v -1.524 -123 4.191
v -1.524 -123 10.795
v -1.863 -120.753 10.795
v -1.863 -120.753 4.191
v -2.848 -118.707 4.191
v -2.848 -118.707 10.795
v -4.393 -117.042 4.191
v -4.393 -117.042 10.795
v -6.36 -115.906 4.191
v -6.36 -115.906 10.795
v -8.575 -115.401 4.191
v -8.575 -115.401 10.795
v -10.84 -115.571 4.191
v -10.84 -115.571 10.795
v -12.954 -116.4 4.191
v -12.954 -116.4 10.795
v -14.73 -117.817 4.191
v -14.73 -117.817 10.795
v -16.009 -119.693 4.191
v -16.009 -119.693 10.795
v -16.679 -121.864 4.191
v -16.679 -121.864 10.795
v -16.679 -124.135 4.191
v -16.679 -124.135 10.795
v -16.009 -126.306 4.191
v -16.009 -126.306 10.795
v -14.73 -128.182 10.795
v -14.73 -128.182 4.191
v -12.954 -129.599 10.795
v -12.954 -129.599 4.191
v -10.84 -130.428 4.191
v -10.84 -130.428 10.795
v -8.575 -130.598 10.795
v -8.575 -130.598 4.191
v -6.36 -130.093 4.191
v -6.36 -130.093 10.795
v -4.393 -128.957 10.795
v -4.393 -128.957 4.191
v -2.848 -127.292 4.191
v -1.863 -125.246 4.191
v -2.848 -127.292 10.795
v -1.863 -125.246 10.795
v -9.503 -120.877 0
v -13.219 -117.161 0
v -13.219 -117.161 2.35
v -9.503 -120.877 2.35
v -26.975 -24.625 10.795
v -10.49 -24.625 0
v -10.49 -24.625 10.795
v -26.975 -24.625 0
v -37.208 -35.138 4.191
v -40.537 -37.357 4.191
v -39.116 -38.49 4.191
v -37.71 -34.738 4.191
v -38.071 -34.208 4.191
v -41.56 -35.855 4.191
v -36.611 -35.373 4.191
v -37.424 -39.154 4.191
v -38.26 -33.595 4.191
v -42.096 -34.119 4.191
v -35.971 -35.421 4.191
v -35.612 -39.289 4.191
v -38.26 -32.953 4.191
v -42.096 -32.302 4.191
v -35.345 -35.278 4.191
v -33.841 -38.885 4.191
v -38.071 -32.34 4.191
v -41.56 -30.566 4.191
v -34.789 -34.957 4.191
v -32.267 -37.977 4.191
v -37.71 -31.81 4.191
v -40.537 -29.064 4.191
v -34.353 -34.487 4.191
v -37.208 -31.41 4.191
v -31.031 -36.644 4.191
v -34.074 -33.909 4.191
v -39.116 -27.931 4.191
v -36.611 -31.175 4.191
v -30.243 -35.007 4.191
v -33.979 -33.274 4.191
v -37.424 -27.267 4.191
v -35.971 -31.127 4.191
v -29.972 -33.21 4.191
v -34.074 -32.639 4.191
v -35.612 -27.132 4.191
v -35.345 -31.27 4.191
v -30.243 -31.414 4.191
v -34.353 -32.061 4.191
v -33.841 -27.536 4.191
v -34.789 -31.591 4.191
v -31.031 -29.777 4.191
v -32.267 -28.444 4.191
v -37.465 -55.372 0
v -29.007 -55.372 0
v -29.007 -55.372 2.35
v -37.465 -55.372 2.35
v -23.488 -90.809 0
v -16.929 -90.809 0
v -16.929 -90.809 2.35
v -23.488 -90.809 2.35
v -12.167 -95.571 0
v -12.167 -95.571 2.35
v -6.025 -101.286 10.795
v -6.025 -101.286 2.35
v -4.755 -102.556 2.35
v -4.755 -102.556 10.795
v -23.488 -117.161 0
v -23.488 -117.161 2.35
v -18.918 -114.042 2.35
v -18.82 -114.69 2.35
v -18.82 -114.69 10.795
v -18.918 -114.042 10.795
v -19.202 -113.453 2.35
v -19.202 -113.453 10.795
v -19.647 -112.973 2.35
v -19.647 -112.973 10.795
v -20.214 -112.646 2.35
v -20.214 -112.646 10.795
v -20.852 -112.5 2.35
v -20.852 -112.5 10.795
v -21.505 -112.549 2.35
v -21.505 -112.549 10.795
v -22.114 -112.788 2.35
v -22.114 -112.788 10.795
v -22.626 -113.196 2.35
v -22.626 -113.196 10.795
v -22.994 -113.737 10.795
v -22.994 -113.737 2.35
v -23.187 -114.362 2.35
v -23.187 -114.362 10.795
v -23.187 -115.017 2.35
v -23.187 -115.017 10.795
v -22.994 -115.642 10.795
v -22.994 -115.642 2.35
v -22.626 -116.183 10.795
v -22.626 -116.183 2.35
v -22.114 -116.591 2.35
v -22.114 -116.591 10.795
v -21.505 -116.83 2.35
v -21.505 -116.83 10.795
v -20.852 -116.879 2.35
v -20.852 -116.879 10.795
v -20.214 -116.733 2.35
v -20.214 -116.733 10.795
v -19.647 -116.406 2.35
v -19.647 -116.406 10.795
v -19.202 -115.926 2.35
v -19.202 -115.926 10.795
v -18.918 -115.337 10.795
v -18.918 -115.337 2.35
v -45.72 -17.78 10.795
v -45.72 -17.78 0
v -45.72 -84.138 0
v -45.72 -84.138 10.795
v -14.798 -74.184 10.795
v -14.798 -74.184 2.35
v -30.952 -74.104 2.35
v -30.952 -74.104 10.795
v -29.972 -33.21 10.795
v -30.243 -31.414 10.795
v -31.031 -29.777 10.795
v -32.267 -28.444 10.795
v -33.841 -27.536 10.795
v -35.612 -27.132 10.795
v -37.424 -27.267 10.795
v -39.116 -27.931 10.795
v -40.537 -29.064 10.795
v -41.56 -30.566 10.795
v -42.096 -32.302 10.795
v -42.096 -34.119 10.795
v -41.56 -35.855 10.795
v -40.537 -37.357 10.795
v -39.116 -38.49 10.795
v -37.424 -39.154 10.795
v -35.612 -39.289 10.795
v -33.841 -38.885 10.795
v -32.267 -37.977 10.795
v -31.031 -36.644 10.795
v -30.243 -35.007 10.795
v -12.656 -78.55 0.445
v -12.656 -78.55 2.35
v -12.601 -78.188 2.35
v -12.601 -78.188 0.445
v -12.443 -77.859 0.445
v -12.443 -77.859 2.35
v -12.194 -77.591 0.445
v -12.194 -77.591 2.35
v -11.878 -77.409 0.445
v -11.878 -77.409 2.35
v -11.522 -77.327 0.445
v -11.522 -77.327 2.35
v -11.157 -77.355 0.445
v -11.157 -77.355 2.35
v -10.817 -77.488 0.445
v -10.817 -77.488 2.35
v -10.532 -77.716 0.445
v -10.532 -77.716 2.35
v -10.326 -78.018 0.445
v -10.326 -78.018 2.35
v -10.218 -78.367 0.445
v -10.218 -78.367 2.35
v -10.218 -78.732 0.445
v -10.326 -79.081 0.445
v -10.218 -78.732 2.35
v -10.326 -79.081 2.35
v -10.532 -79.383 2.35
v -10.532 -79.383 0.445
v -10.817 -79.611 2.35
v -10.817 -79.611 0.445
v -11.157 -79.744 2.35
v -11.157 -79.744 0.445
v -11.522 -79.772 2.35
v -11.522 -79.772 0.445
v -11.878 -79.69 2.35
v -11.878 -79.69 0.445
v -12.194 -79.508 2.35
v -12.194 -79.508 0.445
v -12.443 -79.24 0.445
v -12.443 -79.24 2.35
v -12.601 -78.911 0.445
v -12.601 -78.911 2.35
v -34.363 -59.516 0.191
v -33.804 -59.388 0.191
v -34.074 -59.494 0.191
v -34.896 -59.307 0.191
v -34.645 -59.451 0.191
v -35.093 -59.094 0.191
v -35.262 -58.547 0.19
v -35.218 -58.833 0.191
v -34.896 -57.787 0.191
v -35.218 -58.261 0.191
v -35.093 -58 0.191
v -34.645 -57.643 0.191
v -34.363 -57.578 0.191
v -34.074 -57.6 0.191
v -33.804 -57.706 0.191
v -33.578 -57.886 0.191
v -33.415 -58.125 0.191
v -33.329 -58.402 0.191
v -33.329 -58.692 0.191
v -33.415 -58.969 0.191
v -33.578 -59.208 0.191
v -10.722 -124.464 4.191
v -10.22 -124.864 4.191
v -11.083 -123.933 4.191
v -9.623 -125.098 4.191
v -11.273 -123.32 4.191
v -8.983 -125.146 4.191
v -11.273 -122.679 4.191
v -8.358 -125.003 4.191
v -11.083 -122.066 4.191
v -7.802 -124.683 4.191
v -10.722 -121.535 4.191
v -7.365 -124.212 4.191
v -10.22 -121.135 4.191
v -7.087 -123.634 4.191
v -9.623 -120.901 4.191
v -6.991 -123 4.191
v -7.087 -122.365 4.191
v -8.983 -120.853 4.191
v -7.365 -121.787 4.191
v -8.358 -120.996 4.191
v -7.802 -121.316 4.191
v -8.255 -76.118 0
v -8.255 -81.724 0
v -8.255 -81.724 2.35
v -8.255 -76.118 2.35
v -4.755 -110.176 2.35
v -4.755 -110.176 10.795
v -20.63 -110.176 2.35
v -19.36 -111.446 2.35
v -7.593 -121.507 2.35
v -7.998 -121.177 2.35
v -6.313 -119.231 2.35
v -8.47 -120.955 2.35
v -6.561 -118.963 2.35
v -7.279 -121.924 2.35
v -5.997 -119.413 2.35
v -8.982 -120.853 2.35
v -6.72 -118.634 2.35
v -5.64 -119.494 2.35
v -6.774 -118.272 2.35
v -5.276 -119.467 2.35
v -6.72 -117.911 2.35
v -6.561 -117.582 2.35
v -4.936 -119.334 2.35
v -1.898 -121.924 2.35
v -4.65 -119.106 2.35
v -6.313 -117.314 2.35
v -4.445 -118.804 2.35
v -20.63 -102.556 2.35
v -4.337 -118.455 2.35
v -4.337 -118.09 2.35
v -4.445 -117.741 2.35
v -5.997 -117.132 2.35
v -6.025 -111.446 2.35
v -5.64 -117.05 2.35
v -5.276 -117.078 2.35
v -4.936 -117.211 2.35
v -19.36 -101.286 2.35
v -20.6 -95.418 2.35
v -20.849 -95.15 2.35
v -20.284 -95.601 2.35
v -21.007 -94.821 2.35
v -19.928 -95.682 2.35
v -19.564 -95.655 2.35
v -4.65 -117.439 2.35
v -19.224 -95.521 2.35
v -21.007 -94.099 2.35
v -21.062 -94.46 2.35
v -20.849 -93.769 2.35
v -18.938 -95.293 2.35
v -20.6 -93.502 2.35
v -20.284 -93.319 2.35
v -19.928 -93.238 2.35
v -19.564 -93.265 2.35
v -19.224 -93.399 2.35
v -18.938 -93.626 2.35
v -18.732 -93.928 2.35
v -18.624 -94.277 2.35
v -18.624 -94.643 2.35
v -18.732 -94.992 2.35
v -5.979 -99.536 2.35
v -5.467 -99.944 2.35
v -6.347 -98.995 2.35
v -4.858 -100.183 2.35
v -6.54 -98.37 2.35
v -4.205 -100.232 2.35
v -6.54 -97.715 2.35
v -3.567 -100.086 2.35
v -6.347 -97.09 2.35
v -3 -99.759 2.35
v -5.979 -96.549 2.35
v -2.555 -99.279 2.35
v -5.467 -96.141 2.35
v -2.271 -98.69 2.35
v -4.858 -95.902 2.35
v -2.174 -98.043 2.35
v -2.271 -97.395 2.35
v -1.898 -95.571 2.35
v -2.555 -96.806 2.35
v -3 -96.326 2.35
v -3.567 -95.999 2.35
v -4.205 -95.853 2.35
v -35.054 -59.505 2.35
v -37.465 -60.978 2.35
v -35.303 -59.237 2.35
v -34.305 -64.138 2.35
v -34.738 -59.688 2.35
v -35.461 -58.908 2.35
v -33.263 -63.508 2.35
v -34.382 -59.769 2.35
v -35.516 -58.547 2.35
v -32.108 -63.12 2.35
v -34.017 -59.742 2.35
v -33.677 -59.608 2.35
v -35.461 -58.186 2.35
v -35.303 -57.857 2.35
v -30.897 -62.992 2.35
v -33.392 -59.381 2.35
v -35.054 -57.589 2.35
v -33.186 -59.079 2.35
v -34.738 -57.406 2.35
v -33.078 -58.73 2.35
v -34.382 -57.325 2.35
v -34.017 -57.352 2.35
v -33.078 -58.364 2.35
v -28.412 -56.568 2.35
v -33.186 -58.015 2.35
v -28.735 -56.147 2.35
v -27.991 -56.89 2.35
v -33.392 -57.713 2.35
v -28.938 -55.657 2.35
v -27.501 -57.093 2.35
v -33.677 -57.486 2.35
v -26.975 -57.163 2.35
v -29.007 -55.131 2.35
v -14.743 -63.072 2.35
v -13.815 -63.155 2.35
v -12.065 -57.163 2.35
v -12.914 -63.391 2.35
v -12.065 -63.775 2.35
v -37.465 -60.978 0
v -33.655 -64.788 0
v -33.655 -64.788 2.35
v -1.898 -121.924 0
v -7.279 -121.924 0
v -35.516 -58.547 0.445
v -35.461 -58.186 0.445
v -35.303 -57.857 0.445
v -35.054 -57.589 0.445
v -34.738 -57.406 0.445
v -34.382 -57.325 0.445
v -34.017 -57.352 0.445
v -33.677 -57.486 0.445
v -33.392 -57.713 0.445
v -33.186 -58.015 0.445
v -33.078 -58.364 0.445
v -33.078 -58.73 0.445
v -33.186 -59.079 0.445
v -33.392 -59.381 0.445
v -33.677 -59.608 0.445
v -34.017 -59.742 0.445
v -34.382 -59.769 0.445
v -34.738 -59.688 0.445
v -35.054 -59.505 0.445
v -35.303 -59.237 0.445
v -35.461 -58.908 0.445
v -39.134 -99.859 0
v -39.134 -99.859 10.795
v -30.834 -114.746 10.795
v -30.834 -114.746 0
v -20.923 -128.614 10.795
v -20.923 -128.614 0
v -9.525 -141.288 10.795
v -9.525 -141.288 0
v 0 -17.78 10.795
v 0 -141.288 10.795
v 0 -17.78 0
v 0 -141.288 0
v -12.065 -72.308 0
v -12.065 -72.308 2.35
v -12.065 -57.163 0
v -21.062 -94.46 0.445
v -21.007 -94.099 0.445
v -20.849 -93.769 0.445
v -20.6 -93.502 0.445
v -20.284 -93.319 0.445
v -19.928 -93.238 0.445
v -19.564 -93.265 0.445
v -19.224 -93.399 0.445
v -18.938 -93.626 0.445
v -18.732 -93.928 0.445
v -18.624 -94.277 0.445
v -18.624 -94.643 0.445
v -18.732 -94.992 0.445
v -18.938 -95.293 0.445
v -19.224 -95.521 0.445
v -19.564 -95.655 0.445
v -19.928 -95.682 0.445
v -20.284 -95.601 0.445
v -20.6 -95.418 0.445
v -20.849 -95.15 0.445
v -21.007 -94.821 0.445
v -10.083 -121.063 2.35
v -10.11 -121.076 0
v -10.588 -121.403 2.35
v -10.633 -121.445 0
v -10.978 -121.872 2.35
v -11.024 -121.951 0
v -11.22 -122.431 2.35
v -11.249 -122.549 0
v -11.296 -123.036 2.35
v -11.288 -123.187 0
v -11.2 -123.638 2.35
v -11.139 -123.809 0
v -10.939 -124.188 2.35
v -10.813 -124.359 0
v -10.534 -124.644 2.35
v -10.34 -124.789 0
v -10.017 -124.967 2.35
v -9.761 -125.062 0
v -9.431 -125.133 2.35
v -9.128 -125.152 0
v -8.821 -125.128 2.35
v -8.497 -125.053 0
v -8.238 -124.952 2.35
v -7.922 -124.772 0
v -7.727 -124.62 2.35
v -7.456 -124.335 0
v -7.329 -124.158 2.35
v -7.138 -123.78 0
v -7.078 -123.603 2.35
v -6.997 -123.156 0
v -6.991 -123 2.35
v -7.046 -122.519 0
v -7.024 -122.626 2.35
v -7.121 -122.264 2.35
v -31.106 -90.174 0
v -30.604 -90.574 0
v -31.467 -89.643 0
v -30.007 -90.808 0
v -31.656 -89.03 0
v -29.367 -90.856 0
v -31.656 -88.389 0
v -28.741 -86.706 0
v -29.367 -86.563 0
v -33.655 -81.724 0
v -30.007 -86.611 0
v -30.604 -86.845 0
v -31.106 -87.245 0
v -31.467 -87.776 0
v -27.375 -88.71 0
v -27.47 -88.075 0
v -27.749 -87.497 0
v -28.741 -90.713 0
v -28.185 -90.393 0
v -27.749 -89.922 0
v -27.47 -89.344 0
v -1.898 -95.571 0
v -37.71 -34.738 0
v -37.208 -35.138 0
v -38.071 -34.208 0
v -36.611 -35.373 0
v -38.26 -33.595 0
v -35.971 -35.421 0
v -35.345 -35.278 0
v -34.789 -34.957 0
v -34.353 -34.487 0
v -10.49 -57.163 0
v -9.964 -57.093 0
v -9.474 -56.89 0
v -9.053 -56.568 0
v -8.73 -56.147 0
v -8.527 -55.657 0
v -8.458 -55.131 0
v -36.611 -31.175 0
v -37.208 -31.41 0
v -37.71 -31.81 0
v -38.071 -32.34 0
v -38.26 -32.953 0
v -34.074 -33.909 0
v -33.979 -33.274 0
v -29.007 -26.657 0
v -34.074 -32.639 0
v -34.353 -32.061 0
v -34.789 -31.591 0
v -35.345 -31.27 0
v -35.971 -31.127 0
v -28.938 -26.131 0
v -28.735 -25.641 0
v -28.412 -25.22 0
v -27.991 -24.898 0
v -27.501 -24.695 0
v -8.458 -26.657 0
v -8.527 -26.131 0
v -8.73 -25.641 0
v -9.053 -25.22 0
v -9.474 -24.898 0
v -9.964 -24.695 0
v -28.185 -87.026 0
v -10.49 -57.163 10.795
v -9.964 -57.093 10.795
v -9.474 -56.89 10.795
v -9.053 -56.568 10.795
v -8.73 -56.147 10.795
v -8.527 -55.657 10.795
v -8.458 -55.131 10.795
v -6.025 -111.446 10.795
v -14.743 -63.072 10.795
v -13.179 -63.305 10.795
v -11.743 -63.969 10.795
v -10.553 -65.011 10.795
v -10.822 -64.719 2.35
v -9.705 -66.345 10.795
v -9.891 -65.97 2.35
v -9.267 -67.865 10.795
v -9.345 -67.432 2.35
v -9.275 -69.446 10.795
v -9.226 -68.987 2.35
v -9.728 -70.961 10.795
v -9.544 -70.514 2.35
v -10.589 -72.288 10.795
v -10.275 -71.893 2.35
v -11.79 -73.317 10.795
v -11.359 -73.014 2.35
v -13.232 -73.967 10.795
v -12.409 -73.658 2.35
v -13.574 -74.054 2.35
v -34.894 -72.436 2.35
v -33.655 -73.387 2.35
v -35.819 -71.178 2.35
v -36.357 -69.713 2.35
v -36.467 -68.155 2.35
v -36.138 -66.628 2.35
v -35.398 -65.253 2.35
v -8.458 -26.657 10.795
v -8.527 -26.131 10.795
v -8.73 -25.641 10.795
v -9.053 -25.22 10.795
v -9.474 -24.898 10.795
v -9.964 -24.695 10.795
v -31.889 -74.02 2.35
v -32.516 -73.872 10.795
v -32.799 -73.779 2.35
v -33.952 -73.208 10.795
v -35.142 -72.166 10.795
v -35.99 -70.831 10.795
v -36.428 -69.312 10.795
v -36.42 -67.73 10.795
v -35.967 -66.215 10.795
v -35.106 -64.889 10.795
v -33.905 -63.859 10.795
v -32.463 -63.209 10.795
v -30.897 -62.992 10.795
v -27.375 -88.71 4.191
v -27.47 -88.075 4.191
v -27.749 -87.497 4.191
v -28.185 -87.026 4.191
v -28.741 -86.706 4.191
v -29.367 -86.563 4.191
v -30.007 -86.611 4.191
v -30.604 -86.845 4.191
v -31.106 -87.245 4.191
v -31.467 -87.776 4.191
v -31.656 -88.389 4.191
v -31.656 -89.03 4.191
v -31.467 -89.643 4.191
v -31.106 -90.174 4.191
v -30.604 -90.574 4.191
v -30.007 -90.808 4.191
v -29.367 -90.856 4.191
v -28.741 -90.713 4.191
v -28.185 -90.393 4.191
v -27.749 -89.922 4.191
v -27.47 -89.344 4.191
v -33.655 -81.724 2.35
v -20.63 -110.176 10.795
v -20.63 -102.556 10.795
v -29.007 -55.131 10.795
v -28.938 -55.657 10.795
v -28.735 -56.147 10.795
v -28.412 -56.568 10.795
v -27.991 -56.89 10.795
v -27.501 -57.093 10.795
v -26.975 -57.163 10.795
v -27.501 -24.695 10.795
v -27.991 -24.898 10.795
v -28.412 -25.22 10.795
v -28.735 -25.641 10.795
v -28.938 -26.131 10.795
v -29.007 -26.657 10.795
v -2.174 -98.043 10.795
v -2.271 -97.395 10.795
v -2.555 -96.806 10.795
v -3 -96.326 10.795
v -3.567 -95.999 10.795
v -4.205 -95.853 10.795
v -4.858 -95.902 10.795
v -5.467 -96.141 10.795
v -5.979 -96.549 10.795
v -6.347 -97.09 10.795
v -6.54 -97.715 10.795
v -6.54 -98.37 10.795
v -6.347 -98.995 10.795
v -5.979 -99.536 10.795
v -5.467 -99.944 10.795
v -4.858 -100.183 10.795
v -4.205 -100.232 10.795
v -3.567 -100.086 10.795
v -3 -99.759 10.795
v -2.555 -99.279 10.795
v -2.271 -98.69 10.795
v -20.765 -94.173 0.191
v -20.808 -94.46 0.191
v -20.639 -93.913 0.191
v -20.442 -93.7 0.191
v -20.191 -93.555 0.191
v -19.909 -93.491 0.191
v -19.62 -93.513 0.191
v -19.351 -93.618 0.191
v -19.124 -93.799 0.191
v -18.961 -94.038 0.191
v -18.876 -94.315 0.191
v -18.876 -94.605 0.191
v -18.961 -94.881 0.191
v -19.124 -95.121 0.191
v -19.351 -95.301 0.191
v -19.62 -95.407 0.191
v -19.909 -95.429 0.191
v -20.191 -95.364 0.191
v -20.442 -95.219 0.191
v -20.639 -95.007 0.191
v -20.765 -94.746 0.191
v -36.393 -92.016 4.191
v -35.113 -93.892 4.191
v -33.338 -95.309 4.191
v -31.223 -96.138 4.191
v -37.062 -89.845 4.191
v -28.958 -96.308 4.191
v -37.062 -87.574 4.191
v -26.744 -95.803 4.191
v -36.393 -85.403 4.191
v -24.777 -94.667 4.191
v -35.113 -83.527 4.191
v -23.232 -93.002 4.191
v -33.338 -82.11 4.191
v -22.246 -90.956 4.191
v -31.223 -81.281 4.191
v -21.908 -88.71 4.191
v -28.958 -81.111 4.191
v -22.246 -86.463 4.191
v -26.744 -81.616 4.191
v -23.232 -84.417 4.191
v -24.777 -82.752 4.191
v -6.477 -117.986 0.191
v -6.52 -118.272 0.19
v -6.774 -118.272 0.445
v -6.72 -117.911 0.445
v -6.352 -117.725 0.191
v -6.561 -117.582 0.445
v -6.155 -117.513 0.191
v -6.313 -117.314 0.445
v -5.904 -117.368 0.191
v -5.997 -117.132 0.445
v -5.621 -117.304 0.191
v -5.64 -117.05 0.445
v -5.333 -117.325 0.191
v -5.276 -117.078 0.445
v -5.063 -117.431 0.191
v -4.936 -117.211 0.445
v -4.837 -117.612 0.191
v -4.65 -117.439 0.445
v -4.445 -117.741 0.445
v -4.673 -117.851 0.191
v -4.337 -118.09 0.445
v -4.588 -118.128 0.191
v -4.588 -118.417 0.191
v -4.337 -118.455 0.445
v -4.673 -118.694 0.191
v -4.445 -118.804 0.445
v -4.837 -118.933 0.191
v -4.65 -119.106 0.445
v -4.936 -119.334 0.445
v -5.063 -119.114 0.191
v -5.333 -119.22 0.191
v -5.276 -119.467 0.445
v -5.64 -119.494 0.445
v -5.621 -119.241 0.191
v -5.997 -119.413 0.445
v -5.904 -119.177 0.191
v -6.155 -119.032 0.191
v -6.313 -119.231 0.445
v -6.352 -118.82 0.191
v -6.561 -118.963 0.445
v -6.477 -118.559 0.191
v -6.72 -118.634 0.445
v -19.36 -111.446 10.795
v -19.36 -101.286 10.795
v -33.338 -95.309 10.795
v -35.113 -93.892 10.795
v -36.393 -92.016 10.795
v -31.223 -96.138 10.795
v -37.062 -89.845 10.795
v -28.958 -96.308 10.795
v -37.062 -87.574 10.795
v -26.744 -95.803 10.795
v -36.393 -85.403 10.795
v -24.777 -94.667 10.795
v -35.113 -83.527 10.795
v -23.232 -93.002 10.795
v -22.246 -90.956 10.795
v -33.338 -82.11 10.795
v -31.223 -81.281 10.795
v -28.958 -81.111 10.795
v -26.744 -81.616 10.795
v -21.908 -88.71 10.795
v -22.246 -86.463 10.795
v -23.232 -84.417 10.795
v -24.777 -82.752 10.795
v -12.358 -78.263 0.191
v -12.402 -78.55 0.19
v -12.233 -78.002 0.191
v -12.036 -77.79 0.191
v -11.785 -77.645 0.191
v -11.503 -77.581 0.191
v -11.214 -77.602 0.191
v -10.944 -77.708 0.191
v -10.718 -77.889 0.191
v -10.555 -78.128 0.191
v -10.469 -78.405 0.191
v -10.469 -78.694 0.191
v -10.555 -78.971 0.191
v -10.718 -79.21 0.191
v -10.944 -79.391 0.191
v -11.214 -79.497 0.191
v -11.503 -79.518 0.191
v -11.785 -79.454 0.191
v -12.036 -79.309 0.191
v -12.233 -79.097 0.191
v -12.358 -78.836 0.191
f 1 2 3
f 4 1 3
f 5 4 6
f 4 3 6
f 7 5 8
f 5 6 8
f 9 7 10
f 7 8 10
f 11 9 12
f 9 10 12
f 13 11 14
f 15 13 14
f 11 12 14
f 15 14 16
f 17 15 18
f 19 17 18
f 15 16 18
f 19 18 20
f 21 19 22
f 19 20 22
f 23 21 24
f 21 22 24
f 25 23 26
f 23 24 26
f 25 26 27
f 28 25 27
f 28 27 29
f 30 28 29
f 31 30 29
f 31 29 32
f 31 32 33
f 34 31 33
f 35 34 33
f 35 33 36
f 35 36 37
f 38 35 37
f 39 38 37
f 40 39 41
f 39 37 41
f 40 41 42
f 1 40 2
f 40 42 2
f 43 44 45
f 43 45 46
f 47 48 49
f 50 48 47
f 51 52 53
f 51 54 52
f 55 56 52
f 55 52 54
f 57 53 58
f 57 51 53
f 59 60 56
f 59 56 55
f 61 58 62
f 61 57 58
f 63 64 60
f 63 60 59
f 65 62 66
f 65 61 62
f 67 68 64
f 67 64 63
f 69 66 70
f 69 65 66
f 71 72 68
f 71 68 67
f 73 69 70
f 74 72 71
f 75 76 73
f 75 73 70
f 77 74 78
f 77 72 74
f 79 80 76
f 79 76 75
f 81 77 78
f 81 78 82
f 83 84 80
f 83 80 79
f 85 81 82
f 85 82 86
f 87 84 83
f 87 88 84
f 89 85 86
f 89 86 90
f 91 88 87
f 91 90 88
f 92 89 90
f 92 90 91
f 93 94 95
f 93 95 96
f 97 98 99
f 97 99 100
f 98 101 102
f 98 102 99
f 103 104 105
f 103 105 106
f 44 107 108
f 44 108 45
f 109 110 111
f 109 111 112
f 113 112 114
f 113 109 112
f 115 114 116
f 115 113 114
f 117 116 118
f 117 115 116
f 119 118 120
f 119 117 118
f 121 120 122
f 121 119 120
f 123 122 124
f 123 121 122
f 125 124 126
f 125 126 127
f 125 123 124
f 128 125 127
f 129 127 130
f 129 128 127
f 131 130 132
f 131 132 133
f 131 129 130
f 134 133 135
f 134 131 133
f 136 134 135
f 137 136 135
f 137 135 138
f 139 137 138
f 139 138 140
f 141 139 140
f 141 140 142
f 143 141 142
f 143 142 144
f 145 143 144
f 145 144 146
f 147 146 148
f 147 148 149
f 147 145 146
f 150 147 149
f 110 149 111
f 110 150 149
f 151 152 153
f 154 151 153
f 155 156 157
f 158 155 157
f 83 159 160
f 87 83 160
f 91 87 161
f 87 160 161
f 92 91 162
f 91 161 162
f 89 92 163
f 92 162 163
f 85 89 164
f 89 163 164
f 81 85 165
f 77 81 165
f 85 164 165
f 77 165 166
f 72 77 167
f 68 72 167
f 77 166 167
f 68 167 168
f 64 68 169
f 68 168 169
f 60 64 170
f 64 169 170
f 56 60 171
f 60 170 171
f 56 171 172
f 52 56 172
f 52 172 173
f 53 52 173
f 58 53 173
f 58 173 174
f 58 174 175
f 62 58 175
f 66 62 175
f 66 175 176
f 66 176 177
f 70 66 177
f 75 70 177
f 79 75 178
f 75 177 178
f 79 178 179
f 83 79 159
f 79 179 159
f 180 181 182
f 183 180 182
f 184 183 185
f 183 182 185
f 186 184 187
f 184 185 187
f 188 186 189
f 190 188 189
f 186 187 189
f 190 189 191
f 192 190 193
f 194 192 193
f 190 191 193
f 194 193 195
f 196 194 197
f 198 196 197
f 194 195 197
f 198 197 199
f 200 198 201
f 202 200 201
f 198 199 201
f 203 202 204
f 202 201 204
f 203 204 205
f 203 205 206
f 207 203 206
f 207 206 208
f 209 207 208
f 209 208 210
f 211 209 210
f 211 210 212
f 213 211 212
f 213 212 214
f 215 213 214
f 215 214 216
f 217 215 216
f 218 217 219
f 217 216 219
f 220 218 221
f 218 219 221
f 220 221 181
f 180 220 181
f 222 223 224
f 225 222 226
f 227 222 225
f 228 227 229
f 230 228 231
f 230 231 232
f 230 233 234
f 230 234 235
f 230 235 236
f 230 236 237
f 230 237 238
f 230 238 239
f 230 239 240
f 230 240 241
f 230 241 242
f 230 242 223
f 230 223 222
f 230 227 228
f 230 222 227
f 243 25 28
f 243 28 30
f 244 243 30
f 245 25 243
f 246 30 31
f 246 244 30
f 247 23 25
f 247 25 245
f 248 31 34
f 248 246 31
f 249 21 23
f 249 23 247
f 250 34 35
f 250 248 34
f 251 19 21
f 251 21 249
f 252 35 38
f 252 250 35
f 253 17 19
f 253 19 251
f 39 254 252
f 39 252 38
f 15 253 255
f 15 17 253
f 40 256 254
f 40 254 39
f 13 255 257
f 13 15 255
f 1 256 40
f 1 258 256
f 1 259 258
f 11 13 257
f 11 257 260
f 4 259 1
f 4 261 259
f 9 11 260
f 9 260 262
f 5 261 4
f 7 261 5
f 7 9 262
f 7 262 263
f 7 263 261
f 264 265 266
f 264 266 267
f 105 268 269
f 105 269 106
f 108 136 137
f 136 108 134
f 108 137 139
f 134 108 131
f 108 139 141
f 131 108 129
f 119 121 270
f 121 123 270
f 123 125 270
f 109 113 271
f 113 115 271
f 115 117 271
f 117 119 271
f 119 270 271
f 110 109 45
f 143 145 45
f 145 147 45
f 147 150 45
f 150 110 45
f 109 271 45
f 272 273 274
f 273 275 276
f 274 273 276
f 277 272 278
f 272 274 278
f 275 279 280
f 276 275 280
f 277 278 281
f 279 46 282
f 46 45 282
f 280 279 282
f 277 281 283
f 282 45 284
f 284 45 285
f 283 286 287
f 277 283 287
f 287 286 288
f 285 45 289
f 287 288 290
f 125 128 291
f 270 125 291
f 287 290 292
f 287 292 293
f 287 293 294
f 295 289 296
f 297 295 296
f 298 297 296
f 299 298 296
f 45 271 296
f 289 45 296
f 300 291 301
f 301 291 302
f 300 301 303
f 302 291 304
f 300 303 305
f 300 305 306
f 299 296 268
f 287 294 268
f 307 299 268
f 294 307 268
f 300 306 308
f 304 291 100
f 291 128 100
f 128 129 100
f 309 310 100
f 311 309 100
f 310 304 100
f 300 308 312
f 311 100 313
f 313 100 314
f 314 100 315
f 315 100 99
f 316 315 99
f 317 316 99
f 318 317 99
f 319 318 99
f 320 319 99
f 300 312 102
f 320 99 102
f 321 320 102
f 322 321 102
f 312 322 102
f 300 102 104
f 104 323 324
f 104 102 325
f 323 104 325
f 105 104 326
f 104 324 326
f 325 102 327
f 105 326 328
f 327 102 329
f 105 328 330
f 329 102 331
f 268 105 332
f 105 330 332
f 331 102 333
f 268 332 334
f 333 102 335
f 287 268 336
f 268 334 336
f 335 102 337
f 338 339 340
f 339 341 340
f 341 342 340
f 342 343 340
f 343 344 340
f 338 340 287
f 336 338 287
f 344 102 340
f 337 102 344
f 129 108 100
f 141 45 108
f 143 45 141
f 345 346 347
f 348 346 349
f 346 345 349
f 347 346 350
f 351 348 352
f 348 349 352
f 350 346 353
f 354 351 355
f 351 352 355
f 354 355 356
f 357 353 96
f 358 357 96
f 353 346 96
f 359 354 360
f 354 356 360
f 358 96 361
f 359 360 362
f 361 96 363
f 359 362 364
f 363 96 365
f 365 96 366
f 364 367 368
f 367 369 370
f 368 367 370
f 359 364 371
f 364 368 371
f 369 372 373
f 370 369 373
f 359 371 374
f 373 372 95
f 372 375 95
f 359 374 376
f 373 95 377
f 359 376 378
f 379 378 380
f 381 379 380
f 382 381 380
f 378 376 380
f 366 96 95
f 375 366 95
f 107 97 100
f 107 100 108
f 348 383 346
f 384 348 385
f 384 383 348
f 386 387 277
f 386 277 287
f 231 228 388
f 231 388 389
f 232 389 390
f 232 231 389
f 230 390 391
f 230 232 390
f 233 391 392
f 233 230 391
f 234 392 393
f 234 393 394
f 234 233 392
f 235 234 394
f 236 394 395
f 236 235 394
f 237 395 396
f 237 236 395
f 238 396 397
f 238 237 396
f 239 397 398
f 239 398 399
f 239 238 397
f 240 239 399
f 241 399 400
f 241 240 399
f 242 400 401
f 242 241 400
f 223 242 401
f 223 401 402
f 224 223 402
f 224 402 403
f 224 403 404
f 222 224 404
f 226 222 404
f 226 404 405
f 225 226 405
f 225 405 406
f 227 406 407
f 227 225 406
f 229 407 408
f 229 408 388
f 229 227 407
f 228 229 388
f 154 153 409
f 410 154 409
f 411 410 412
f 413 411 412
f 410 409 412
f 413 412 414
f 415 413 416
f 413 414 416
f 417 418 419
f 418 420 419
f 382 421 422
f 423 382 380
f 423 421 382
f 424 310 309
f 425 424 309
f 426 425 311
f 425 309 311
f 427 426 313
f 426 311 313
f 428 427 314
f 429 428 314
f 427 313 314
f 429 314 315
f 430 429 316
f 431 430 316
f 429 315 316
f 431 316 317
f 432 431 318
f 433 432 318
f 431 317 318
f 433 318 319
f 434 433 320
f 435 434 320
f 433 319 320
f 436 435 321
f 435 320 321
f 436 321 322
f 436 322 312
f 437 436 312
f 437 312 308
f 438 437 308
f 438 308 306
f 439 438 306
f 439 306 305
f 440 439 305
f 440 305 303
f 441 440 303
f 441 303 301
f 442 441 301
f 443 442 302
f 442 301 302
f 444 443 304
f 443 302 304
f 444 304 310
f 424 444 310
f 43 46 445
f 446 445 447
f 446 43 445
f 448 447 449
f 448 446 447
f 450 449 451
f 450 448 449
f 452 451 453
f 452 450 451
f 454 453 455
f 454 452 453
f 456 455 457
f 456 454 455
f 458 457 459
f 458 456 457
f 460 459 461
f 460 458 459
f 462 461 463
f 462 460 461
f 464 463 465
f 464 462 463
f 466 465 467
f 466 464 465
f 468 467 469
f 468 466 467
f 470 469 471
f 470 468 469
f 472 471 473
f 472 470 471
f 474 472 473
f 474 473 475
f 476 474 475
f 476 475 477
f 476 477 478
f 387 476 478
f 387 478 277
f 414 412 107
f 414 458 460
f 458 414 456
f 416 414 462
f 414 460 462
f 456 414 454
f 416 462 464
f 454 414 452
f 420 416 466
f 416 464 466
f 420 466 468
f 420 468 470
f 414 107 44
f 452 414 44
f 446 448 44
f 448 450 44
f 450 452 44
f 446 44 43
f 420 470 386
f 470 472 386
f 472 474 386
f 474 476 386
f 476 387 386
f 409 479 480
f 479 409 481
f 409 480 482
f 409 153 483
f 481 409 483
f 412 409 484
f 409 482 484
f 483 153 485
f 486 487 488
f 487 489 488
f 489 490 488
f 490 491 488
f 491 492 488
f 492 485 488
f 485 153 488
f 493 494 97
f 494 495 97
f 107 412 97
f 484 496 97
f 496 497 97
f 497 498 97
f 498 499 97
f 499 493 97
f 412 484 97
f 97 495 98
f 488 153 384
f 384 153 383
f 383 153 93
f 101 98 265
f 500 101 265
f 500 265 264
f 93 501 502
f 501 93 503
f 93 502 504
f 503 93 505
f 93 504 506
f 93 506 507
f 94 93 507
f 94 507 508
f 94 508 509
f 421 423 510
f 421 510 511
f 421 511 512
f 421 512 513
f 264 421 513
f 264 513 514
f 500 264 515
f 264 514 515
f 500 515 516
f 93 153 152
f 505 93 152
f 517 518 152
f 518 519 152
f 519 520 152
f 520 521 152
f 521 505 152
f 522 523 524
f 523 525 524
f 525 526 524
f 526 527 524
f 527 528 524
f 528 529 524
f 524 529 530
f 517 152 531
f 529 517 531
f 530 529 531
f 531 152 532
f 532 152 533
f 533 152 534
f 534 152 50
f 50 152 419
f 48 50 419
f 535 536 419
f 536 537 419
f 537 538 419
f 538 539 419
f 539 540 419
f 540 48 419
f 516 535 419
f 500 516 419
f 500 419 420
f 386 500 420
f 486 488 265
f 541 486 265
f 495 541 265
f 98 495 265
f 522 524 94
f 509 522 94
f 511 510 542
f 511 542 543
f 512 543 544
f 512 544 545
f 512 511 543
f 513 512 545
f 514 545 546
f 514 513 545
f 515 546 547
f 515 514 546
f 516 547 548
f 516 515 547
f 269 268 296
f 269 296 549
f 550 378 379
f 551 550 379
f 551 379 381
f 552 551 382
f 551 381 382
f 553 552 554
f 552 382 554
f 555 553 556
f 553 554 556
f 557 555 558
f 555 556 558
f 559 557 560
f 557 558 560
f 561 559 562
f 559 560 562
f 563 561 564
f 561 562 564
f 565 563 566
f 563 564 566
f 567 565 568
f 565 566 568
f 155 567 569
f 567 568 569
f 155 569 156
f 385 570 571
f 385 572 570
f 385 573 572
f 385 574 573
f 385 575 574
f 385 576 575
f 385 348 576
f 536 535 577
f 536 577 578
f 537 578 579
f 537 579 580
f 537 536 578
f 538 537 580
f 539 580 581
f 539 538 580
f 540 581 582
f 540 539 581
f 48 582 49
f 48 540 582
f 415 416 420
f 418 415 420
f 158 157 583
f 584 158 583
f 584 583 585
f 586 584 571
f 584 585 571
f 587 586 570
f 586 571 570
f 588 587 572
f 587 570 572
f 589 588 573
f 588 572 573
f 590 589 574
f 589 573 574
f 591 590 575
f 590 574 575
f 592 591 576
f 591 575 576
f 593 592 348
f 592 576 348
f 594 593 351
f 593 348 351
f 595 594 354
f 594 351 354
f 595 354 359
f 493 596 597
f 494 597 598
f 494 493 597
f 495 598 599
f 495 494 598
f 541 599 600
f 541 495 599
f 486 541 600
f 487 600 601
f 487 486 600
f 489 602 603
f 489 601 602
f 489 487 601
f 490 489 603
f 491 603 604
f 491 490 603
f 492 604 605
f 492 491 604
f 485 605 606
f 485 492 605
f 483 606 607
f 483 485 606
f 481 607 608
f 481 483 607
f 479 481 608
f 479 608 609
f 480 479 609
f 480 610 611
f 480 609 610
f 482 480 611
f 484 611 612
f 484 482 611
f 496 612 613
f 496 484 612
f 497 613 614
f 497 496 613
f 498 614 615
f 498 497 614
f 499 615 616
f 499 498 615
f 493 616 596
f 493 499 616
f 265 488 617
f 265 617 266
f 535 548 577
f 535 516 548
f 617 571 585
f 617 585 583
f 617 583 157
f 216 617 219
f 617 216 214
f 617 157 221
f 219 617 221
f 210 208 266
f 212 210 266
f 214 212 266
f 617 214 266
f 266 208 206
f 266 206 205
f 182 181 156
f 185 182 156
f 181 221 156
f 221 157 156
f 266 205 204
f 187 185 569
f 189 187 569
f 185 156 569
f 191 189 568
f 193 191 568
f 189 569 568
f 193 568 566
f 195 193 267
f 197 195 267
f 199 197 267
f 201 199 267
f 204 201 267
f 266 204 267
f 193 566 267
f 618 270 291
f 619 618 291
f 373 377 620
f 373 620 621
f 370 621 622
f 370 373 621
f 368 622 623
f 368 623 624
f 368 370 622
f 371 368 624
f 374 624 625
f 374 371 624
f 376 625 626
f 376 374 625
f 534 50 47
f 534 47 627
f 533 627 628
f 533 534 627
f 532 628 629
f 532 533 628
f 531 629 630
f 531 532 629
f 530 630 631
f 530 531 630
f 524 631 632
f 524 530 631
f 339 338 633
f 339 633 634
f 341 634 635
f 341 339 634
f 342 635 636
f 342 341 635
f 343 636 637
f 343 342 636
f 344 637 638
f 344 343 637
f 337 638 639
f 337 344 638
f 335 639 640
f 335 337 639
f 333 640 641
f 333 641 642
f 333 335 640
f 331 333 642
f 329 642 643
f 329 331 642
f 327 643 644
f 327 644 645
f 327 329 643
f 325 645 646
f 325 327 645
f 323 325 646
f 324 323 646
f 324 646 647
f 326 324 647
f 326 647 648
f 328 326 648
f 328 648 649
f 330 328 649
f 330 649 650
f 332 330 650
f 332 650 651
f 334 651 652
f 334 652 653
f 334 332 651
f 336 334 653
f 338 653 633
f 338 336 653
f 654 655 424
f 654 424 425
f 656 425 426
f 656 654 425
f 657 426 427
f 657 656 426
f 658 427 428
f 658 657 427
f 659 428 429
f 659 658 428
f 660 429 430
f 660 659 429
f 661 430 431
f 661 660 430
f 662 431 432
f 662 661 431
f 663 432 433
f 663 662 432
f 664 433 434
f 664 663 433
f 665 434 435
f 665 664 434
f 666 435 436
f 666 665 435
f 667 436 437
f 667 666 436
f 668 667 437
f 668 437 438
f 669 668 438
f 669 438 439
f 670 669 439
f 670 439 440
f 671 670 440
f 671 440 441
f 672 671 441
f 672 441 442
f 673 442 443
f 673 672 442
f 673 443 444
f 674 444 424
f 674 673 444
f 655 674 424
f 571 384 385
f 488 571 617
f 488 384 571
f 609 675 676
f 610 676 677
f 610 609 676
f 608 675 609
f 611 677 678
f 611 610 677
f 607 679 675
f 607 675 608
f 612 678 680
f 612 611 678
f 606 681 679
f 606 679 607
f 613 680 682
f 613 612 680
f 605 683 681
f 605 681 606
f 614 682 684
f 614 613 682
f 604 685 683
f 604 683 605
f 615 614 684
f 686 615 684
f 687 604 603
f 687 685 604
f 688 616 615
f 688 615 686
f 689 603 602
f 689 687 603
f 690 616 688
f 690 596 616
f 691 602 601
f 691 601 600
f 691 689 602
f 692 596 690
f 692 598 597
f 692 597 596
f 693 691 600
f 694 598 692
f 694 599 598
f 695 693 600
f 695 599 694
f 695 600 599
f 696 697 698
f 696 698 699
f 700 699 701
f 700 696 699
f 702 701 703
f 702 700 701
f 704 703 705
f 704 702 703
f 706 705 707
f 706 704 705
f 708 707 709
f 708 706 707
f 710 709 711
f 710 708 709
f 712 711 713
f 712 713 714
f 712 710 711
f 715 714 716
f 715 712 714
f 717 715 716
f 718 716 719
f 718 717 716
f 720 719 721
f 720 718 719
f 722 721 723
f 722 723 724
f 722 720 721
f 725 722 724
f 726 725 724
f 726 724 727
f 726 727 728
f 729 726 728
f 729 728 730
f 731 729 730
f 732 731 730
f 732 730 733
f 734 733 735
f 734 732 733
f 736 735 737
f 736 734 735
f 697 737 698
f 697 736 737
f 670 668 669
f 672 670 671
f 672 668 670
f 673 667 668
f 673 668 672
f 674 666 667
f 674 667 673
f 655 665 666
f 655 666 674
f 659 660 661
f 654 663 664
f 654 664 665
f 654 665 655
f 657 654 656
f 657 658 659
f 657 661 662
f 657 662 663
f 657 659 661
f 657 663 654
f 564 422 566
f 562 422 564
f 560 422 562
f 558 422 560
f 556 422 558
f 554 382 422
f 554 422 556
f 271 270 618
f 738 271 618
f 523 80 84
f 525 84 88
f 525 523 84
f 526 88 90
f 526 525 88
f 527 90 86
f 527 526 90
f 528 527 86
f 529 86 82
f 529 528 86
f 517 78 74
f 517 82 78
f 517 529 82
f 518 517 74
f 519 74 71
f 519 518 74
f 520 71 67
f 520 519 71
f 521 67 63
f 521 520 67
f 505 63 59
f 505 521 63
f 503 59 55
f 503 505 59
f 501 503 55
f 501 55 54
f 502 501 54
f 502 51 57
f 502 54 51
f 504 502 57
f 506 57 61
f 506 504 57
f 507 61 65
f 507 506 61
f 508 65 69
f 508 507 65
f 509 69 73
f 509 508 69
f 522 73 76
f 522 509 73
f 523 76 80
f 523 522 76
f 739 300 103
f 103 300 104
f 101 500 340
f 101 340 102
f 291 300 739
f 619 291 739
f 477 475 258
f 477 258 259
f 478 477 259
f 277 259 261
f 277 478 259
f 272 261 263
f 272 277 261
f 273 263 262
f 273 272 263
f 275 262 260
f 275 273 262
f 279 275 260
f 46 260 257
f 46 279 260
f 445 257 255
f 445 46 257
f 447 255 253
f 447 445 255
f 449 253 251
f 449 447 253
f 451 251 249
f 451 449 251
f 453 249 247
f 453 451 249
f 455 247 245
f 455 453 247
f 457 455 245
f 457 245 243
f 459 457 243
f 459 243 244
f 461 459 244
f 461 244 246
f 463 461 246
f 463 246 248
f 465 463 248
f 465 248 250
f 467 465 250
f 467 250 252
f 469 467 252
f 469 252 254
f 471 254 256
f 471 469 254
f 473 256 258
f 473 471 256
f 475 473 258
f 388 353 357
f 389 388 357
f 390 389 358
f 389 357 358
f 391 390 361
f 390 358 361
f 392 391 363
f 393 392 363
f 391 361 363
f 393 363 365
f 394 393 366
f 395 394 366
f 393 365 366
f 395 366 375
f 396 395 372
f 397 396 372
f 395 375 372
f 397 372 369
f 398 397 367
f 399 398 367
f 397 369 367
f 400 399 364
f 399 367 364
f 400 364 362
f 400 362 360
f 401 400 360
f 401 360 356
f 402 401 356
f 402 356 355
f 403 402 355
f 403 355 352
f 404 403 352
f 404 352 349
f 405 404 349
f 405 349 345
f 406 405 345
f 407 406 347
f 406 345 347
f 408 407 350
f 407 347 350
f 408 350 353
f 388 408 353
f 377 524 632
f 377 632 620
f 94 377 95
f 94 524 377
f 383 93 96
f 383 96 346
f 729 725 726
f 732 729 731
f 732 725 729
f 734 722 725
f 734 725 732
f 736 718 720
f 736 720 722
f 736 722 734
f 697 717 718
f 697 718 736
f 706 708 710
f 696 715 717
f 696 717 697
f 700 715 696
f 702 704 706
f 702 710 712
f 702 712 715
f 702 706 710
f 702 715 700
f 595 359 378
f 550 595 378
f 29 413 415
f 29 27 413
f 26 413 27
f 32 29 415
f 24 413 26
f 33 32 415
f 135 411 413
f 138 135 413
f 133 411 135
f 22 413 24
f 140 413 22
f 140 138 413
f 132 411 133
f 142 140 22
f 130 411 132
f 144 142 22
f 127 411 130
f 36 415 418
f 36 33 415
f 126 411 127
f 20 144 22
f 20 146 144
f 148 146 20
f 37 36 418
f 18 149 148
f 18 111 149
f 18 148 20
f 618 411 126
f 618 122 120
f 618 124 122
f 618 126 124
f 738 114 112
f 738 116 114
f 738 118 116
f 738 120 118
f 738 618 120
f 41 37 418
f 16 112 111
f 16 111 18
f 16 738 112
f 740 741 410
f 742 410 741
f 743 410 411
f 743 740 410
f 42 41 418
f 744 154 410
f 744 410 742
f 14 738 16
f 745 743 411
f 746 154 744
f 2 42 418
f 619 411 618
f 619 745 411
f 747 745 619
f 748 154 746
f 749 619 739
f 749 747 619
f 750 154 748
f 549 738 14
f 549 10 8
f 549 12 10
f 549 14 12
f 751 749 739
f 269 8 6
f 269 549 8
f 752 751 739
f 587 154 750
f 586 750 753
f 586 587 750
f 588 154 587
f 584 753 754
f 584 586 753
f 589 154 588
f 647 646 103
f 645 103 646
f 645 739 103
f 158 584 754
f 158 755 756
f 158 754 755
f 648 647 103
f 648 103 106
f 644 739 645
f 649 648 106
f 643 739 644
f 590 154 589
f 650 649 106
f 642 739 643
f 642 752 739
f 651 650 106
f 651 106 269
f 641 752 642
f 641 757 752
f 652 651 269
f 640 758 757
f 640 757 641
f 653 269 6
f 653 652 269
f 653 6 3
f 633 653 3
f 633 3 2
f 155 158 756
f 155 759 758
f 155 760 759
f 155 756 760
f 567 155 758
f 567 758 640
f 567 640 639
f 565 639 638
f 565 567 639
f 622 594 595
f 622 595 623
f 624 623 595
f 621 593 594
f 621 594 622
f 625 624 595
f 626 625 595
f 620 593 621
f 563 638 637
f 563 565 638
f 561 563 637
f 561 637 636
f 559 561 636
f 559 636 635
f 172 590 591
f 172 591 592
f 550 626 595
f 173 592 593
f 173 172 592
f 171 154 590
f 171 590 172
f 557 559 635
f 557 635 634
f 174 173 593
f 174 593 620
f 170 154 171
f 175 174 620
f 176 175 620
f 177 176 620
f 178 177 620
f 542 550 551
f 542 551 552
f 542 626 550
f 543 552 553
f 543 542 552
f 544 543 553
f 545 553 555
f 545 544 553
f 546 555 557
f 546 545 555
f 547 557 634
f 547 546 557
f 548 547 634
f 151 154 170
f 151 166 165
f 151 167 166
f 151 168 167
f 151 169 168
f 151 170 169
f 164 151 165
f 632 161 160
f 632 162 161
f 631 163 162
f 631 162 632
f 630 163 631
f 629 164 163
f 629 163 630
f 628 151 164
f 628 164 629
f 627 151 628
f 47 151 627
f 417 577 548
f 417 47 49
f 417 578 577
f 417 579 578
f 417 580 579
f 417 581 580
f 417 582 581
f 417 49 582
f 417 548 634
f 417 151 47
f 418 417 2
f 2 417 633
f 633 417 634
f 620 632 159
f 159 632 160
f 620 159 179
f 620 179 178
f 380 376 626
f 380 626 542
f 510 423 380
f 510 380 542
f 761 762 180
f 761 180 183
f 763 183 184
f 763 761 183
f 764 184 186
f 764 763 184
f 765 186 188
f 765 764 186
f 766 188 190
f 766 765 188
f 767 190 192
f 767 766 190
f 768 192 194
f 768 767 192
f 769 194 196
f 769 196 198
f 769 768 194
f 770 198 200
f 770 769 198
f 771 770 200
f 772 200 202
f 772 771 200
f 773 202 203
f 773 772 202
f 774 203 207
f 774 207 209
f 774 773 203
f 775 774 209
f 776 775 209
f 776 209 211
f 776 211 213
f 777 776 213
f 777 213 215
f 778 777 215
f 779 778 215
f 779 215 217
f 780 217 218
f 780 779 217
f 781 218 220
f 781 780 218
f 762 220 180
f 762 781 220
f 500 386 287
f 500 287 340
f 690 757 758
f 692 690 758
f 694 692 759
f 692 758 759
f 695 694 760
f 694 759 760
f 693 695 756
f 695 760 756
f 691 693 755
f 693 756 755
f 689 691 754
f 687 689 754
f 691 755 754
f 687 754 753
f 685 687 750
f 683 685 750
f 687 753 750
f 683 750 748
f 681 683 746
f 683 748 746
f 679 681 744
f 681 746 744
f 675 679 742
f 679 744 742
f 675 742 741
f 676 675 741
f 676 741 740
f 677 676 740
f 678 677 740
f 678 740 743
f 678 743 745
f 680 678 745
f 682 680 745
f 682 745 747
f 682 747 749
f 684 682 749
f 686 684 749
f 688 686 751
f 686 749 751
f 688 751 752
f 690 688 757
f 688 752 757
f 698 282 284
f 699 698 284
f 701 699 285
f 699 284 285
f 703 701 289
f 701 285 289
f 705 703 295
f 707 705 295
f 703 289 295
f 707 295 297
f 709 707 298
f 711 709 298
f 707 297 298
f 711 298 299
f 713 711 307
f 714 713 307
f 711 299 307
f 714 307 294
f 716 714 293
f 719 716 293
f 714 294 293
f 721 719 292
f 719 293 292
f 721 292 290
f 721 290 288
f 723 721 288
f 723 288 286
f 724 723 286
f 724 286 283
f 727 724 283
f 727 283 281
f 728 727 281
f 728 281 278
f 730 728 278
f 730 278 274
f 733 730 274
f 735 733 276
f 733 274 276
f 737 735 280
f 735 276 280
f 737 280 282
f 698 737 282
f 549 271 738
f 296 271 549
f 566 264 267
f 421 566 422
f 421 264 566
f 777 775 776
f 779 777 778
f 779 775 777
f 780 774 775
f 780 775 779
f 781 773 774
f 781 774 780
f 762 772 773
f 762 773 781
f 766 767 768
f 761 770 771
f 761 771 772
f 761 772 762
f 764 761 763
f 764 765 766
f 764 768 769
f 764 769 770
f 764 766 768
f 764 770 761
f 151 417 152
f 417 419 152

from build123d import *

# Parameters (mm, degrees)
SKETCH1_R           = 2.15265
BOSS_EXTRUDE1_DEPTH = 2.3495
SKETCH2_R           = 2.15265
SKETCH2_R_2         = 2.195581339
SKETCH2_W           = 15.875
SKETCH2_H           = 10.16
BOSS_EXTRUDE2_DEPTH = 8.4455
SKETCH3_R           = 1.22555
BOSS_EXTRUDE3_DEPTH = 2.159
CHAMFER1_SIZE       = 0.254
CHAMFER2_SIZE       = 1.27
SKETCH5_R           = 7.62
SKETCH5_R_2         = 6.096
CUT_EXTRUDE1_DEPTH  = 6.604


with BuildPart() as part:
    # Sketch1 → Boss-Extrude1 (new body)
    with BuildSketch(Plane.XY):
        with BuildLine():
            Line((0, -17.78), (-45.72, -17.78))
            Line((-45.72, -17.78), (-45.72, -84.1375))
            ThreePointArc((-45.72, -84.1375), (-30.833523511, -114.746148224), (-9.525, -141.2875))
            Line((-9.525, -141.2875), (0, -141.2875))
            Line((0, -141.2875), (0, -17.78))
        make_face()
        with Locations((-36.1315, -33.274)):
            Circle(SKETCH1_R, mode=Mode.SUBTRACT)
        with Locations((-29.5275, -88.7095)):
            Circle(SKETCH1_R, mode=Mode.SUBTRACT)
        with BuildLine():
            Line((-1.89756812, -121.923613785), (-1.89756812, -95.571113785))
            Line((-1.89756812, -95.571113785), (-12.166516896, -95.571113785))
            Line((-12.166516896, -95.571113785), (-16.929016896, -90.808613785))
            Line((-16.929016896, -90.808613785), (-23.48756812, -90.808613785))
            Line((-23.48756812, -90.808613785), (-23.48756812, -117.161113785))
            Line((-23.48756812, -117.161113785), (-13.218619344, -117.161113785))
            Line((-13.218619344, -117.161113785), (-9.502774703, -120.876958426))
            ThreePointArc((-9.502774703, -120.876958426), (-10.060883947, -124.947120561), (-7.279497151, -121.923613785))
            Line((-7.279497151, -121.923613785), (-1.89756812, -121.923613785))
        make_face(mode=Mode.SUBTRACT)
        with BuildLine():
            Line((-33.655, -81.7245), (-8.255, -81.7245))
            Line((-8.255, -81.7245), (-8.255, -76.118448776))
            Line((-8.255, -76.118448776), (-12.065, -72.308448776))
            Line((-12.065, -72.308448776), (-12.065, -57.1627))
            Line((-12.065, -57.1627), (-10.4902, -57.1627))
            ThreePointArc((-10.4902, -57.1627), (-9.053359021, -56.567540979), (-8.4582, -55.1307))
            Line((-8.4582, -55.1307), (-8.4582, -26.6573))
            ThreePointArc((-8.4582, -26.6573), (-9.053359021, -25.220459021), (-10.4902, -24.6253))
            Line((-10.4902, -24.6253), (-26.9748, -24.6253))
            ThreePointArc((-26.9748, -24.6253), (-28.411640979, -25.220459021), (-29.0068, -26.6573))
            Line((-29.0068, -26.6573), (-29.0068, -55.372))
            Line((-29.0068, -55.372), (-37.465, -55.372))
            Line((-37.465, -55.372), (-37.465, -60.978051224))
            Line((-37.465, -60.978051224), (-33.655, -64.788051224))
            Line((-33.655, -64.788051224), (-33.655, -81.7245))
        make_face(mode=Mode.SUBTRACT)
    extrude(amount=BOSS_EXTRUDE1_DEPTH)

    # Sketch2 → Boss-Extrude2 (add)
    with BuildSketch(Plane.XY.offset(2.3495)):
        with BuildLine():
            Line((-9.525, -141.2875), (0, -141.2875))
            Line((0, -141.2875), (0, -17.78))
            Line((0, -17.78), (-45.72, -17.78))
            Line((-45.72, -17.78), (-45.72, -84.1375))
            ThreePointArc((-45.72, -84.1375), (-30.833523511, -114.746148224), (-9.525, -141.2875))
        make_face()
        with Locations((-9.144, -122.9995)):
            Circle(SKETCH2_R, mode=Mode.SUBTRACT)
        with Locations((-29.5275, -88.7095)):
            Circle(SKETCH2_R, mode=Mode.SUBTRACT)
        with Locations((-21.016048243, -114.689593907)):
            Circle(SKETCH2_R_2, mode=Mode.SUBTRACT)
        with Locations((-4.369087998, -98.042633662)):
            Circle(SKETCH2_R_2, mode=Mode.SUBTRACT)
        with Locations((-36.1315, -33.274)):
            Circle(SKETCH2_R, mode=Mode.SUBTRACT)
        with Locations((-12.69256812, -106.366113785)):
            Rectangle(SKETCH2_W, SKETCH2_H, mode=Mode.SUBTRACT)
        with BuildLine():
            Line((-14.798016067, -74.184431866), (-30.952016067, -74.104431866))
            ThreePointArc((-30.952016067, -74.104431866), (-36.480681866, -68.520733933), (-30.896983933, -62.992068134))
            Line((-30.896983933, -62.992068134), (-14.742983933, -63.072068134))
            ThreePointArc((-14.742983933, -63.072068134), (-9.214318134, -68.655766067), (-14.798016067, -74.184431866))
        make_face(mode=Mode.SUBTRACT)
        with BuildLine():
            Line((-8.4582, -55.1307), (-8.4582, -26.6573))
            ThreePointArc((-8.4582, -26.6573), (-9.053359021, -25.220459021), (-10.4902, -24.6253))
            Line((-10.4902, -24.6253), (-26.9748, -24.6253))
            ThreePointArc((-26.9748, -24.6253), (-28.411640979, -25.220459021), (-29.0068, -26.6573))
            Line((-29.0068, -26.6573), (-29.0068, -55.1307))
            ThreePointArc((-29.0068, -55.1307), (-28.411640979, -56.567540979), (-26.9748, -57.1627))
            Line((-26.9748, -57.1627), (-10.4902, -57.1627))
            ThreePointArc((-10.4902, -57.1627), (-9.053359021, -56.567540979), (-8.4582, -55.1307))
        make_face(mode=Mode.SUBTRACT)
    extrude(amount=BOSS_EXTRUDE2_DEPTH)

    # Sketch3 → Boss-Extrude3 (add)
    with BuildSketch(Plane(origin=(0, 0, 2.3495), x_dir=(-1, 0, 0), z_dir=(0, 0, -1))):
        with Locations((34.29, -58.547)):
            Circle(SKETCH3_R)
        with Locations((11.43, -78.5495)):
            Circle(SKETCH3_R)
        with Locations((5.54881812, -118.272363785)):
            Circle(SKETCH3_R)
        with Locations((19.83631812, -94.459863785)):
            Circle(SKETCH3_R)
    extrude(amount=BOSS_EXTRUDE3_DEPTH)

    # Chamfer1
    chamfer1_edges = [part.edges().sort_by_distance(p)[0] for p in [
        (-33.06445, -58.547, 0.1905),
        (-10.20445, -78.5495, 0.1905),
        (-4.32326812, -118.272363785, 0.1905),
        (-18.61076812, -94.459863785, 0.1905),
    ]]
    chamfer(chamfer1_edges, length=CHAMFER1_SIZE)

    # Chamfer2
    chamfer2_edges = [part.edges().sort_by_distance(p)[0] for p in [
        (-20.63006812, -111.446113785, 6.57225),
        (-4.75506812, -111.446113785, 6.57225),
        (-4.75506812, -101.286113785, 6.57225),
        (-20.63006812, -101.286113785, 6.57225),
    ]]
    chamfer(chamfer2_edges, length=CHAMFER2_SIZE)

    # Sketch5 → Cut-Extrude1 (cut)
    with BuildSketch(Plane.XY.offset(10.795)):
        with Locations((-9.144, -122.9995)):
            Circle(SKETCH5_R)
        with Locations((-29.5275, -88.7095)):
            Circle(SKETCH5_R)
        with Locations((-36.068, -33.2105)):
            Circle(SKETCH5_R_2)
    extrude(amount=-CUT_EXTRUDE1_DEPTH, mode=Mode.SUBTRACT)


solid = part.part
